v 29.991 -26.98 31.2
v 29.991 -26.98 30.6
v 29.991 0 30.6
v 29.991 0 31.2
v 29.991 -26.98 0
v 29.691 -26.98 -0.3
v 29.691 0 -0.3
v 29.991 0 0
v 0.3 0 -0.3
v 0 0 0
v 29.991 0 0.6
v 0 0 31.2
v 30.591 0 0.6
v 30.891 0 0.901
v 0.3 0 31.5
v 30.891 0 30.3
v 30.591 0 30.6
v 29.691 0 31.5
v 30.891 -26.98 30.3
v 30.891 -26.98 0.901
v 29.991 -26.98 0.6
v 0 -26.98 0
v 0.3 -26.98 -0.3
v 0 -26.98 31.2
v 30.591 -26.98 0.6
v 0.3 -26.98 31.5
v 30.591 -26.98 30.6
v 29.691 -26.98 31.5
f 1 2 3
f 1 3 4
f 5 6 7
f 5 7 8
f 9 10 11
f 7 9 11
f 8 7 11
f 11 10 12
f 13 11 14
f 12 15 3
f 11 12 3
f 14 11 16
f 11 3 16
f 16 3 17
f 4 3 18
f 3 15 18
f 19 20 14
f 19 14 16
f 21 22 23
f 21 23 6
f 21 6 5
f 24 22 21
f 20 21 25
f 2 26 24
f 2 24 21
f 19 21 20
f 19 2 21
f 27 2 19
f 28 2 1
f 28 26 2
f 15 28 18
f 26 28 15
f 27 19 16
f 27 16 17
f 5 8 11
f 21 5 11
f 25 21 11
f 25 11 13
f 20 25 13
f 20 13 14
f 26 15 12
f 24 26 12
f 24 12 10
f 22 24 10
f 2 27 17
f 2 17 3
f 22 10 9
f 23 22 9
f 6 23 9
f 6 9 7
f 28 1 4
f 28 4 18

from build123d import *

# Parameters (mm, degrees)
F1_DEPTH = 26.98
F3_DEPTH = 26.98


# Not quite as in the source:
# - ends of sketch curves that miss each other by under 0.0002 mm in the source are joined


with BuildPart() as f1:
    # F0 (on Front) → F1 (new body)
    with BuildSketch(Plane.XZ):
        Polygon((0, 31.2), (0, 0), (29.991, 0), (29.991, 0.6005), (30.5914, 0.6005), (30.5914, 30.5996), (29.991, 30.5996), (29.991, 31.2), align=None)
    extrude(amount=F1_DEPTH)

    # F2 (on face) → F3 (join, through all)
    with BuildSketch(Plane.XZ.offset(26.98)):
        Polygon((0.3, 31.5), (0, 31.2), (29.991, 31.2), (29.691, 31.5), align=None)
        Polygon((30.8914, 30.2996), (30.5914, 30.5996), (30.5914, 0.6005), (30.8914480512, 0.9005009807), align=None)
        Polygon((29.991, 0), (0, 0), (0.3000519754, -0.2999990192), (29.6910519752, -0.2999029432), align=None)
    extrude(amount=-F3_DEPTH)


solid = f1.part
